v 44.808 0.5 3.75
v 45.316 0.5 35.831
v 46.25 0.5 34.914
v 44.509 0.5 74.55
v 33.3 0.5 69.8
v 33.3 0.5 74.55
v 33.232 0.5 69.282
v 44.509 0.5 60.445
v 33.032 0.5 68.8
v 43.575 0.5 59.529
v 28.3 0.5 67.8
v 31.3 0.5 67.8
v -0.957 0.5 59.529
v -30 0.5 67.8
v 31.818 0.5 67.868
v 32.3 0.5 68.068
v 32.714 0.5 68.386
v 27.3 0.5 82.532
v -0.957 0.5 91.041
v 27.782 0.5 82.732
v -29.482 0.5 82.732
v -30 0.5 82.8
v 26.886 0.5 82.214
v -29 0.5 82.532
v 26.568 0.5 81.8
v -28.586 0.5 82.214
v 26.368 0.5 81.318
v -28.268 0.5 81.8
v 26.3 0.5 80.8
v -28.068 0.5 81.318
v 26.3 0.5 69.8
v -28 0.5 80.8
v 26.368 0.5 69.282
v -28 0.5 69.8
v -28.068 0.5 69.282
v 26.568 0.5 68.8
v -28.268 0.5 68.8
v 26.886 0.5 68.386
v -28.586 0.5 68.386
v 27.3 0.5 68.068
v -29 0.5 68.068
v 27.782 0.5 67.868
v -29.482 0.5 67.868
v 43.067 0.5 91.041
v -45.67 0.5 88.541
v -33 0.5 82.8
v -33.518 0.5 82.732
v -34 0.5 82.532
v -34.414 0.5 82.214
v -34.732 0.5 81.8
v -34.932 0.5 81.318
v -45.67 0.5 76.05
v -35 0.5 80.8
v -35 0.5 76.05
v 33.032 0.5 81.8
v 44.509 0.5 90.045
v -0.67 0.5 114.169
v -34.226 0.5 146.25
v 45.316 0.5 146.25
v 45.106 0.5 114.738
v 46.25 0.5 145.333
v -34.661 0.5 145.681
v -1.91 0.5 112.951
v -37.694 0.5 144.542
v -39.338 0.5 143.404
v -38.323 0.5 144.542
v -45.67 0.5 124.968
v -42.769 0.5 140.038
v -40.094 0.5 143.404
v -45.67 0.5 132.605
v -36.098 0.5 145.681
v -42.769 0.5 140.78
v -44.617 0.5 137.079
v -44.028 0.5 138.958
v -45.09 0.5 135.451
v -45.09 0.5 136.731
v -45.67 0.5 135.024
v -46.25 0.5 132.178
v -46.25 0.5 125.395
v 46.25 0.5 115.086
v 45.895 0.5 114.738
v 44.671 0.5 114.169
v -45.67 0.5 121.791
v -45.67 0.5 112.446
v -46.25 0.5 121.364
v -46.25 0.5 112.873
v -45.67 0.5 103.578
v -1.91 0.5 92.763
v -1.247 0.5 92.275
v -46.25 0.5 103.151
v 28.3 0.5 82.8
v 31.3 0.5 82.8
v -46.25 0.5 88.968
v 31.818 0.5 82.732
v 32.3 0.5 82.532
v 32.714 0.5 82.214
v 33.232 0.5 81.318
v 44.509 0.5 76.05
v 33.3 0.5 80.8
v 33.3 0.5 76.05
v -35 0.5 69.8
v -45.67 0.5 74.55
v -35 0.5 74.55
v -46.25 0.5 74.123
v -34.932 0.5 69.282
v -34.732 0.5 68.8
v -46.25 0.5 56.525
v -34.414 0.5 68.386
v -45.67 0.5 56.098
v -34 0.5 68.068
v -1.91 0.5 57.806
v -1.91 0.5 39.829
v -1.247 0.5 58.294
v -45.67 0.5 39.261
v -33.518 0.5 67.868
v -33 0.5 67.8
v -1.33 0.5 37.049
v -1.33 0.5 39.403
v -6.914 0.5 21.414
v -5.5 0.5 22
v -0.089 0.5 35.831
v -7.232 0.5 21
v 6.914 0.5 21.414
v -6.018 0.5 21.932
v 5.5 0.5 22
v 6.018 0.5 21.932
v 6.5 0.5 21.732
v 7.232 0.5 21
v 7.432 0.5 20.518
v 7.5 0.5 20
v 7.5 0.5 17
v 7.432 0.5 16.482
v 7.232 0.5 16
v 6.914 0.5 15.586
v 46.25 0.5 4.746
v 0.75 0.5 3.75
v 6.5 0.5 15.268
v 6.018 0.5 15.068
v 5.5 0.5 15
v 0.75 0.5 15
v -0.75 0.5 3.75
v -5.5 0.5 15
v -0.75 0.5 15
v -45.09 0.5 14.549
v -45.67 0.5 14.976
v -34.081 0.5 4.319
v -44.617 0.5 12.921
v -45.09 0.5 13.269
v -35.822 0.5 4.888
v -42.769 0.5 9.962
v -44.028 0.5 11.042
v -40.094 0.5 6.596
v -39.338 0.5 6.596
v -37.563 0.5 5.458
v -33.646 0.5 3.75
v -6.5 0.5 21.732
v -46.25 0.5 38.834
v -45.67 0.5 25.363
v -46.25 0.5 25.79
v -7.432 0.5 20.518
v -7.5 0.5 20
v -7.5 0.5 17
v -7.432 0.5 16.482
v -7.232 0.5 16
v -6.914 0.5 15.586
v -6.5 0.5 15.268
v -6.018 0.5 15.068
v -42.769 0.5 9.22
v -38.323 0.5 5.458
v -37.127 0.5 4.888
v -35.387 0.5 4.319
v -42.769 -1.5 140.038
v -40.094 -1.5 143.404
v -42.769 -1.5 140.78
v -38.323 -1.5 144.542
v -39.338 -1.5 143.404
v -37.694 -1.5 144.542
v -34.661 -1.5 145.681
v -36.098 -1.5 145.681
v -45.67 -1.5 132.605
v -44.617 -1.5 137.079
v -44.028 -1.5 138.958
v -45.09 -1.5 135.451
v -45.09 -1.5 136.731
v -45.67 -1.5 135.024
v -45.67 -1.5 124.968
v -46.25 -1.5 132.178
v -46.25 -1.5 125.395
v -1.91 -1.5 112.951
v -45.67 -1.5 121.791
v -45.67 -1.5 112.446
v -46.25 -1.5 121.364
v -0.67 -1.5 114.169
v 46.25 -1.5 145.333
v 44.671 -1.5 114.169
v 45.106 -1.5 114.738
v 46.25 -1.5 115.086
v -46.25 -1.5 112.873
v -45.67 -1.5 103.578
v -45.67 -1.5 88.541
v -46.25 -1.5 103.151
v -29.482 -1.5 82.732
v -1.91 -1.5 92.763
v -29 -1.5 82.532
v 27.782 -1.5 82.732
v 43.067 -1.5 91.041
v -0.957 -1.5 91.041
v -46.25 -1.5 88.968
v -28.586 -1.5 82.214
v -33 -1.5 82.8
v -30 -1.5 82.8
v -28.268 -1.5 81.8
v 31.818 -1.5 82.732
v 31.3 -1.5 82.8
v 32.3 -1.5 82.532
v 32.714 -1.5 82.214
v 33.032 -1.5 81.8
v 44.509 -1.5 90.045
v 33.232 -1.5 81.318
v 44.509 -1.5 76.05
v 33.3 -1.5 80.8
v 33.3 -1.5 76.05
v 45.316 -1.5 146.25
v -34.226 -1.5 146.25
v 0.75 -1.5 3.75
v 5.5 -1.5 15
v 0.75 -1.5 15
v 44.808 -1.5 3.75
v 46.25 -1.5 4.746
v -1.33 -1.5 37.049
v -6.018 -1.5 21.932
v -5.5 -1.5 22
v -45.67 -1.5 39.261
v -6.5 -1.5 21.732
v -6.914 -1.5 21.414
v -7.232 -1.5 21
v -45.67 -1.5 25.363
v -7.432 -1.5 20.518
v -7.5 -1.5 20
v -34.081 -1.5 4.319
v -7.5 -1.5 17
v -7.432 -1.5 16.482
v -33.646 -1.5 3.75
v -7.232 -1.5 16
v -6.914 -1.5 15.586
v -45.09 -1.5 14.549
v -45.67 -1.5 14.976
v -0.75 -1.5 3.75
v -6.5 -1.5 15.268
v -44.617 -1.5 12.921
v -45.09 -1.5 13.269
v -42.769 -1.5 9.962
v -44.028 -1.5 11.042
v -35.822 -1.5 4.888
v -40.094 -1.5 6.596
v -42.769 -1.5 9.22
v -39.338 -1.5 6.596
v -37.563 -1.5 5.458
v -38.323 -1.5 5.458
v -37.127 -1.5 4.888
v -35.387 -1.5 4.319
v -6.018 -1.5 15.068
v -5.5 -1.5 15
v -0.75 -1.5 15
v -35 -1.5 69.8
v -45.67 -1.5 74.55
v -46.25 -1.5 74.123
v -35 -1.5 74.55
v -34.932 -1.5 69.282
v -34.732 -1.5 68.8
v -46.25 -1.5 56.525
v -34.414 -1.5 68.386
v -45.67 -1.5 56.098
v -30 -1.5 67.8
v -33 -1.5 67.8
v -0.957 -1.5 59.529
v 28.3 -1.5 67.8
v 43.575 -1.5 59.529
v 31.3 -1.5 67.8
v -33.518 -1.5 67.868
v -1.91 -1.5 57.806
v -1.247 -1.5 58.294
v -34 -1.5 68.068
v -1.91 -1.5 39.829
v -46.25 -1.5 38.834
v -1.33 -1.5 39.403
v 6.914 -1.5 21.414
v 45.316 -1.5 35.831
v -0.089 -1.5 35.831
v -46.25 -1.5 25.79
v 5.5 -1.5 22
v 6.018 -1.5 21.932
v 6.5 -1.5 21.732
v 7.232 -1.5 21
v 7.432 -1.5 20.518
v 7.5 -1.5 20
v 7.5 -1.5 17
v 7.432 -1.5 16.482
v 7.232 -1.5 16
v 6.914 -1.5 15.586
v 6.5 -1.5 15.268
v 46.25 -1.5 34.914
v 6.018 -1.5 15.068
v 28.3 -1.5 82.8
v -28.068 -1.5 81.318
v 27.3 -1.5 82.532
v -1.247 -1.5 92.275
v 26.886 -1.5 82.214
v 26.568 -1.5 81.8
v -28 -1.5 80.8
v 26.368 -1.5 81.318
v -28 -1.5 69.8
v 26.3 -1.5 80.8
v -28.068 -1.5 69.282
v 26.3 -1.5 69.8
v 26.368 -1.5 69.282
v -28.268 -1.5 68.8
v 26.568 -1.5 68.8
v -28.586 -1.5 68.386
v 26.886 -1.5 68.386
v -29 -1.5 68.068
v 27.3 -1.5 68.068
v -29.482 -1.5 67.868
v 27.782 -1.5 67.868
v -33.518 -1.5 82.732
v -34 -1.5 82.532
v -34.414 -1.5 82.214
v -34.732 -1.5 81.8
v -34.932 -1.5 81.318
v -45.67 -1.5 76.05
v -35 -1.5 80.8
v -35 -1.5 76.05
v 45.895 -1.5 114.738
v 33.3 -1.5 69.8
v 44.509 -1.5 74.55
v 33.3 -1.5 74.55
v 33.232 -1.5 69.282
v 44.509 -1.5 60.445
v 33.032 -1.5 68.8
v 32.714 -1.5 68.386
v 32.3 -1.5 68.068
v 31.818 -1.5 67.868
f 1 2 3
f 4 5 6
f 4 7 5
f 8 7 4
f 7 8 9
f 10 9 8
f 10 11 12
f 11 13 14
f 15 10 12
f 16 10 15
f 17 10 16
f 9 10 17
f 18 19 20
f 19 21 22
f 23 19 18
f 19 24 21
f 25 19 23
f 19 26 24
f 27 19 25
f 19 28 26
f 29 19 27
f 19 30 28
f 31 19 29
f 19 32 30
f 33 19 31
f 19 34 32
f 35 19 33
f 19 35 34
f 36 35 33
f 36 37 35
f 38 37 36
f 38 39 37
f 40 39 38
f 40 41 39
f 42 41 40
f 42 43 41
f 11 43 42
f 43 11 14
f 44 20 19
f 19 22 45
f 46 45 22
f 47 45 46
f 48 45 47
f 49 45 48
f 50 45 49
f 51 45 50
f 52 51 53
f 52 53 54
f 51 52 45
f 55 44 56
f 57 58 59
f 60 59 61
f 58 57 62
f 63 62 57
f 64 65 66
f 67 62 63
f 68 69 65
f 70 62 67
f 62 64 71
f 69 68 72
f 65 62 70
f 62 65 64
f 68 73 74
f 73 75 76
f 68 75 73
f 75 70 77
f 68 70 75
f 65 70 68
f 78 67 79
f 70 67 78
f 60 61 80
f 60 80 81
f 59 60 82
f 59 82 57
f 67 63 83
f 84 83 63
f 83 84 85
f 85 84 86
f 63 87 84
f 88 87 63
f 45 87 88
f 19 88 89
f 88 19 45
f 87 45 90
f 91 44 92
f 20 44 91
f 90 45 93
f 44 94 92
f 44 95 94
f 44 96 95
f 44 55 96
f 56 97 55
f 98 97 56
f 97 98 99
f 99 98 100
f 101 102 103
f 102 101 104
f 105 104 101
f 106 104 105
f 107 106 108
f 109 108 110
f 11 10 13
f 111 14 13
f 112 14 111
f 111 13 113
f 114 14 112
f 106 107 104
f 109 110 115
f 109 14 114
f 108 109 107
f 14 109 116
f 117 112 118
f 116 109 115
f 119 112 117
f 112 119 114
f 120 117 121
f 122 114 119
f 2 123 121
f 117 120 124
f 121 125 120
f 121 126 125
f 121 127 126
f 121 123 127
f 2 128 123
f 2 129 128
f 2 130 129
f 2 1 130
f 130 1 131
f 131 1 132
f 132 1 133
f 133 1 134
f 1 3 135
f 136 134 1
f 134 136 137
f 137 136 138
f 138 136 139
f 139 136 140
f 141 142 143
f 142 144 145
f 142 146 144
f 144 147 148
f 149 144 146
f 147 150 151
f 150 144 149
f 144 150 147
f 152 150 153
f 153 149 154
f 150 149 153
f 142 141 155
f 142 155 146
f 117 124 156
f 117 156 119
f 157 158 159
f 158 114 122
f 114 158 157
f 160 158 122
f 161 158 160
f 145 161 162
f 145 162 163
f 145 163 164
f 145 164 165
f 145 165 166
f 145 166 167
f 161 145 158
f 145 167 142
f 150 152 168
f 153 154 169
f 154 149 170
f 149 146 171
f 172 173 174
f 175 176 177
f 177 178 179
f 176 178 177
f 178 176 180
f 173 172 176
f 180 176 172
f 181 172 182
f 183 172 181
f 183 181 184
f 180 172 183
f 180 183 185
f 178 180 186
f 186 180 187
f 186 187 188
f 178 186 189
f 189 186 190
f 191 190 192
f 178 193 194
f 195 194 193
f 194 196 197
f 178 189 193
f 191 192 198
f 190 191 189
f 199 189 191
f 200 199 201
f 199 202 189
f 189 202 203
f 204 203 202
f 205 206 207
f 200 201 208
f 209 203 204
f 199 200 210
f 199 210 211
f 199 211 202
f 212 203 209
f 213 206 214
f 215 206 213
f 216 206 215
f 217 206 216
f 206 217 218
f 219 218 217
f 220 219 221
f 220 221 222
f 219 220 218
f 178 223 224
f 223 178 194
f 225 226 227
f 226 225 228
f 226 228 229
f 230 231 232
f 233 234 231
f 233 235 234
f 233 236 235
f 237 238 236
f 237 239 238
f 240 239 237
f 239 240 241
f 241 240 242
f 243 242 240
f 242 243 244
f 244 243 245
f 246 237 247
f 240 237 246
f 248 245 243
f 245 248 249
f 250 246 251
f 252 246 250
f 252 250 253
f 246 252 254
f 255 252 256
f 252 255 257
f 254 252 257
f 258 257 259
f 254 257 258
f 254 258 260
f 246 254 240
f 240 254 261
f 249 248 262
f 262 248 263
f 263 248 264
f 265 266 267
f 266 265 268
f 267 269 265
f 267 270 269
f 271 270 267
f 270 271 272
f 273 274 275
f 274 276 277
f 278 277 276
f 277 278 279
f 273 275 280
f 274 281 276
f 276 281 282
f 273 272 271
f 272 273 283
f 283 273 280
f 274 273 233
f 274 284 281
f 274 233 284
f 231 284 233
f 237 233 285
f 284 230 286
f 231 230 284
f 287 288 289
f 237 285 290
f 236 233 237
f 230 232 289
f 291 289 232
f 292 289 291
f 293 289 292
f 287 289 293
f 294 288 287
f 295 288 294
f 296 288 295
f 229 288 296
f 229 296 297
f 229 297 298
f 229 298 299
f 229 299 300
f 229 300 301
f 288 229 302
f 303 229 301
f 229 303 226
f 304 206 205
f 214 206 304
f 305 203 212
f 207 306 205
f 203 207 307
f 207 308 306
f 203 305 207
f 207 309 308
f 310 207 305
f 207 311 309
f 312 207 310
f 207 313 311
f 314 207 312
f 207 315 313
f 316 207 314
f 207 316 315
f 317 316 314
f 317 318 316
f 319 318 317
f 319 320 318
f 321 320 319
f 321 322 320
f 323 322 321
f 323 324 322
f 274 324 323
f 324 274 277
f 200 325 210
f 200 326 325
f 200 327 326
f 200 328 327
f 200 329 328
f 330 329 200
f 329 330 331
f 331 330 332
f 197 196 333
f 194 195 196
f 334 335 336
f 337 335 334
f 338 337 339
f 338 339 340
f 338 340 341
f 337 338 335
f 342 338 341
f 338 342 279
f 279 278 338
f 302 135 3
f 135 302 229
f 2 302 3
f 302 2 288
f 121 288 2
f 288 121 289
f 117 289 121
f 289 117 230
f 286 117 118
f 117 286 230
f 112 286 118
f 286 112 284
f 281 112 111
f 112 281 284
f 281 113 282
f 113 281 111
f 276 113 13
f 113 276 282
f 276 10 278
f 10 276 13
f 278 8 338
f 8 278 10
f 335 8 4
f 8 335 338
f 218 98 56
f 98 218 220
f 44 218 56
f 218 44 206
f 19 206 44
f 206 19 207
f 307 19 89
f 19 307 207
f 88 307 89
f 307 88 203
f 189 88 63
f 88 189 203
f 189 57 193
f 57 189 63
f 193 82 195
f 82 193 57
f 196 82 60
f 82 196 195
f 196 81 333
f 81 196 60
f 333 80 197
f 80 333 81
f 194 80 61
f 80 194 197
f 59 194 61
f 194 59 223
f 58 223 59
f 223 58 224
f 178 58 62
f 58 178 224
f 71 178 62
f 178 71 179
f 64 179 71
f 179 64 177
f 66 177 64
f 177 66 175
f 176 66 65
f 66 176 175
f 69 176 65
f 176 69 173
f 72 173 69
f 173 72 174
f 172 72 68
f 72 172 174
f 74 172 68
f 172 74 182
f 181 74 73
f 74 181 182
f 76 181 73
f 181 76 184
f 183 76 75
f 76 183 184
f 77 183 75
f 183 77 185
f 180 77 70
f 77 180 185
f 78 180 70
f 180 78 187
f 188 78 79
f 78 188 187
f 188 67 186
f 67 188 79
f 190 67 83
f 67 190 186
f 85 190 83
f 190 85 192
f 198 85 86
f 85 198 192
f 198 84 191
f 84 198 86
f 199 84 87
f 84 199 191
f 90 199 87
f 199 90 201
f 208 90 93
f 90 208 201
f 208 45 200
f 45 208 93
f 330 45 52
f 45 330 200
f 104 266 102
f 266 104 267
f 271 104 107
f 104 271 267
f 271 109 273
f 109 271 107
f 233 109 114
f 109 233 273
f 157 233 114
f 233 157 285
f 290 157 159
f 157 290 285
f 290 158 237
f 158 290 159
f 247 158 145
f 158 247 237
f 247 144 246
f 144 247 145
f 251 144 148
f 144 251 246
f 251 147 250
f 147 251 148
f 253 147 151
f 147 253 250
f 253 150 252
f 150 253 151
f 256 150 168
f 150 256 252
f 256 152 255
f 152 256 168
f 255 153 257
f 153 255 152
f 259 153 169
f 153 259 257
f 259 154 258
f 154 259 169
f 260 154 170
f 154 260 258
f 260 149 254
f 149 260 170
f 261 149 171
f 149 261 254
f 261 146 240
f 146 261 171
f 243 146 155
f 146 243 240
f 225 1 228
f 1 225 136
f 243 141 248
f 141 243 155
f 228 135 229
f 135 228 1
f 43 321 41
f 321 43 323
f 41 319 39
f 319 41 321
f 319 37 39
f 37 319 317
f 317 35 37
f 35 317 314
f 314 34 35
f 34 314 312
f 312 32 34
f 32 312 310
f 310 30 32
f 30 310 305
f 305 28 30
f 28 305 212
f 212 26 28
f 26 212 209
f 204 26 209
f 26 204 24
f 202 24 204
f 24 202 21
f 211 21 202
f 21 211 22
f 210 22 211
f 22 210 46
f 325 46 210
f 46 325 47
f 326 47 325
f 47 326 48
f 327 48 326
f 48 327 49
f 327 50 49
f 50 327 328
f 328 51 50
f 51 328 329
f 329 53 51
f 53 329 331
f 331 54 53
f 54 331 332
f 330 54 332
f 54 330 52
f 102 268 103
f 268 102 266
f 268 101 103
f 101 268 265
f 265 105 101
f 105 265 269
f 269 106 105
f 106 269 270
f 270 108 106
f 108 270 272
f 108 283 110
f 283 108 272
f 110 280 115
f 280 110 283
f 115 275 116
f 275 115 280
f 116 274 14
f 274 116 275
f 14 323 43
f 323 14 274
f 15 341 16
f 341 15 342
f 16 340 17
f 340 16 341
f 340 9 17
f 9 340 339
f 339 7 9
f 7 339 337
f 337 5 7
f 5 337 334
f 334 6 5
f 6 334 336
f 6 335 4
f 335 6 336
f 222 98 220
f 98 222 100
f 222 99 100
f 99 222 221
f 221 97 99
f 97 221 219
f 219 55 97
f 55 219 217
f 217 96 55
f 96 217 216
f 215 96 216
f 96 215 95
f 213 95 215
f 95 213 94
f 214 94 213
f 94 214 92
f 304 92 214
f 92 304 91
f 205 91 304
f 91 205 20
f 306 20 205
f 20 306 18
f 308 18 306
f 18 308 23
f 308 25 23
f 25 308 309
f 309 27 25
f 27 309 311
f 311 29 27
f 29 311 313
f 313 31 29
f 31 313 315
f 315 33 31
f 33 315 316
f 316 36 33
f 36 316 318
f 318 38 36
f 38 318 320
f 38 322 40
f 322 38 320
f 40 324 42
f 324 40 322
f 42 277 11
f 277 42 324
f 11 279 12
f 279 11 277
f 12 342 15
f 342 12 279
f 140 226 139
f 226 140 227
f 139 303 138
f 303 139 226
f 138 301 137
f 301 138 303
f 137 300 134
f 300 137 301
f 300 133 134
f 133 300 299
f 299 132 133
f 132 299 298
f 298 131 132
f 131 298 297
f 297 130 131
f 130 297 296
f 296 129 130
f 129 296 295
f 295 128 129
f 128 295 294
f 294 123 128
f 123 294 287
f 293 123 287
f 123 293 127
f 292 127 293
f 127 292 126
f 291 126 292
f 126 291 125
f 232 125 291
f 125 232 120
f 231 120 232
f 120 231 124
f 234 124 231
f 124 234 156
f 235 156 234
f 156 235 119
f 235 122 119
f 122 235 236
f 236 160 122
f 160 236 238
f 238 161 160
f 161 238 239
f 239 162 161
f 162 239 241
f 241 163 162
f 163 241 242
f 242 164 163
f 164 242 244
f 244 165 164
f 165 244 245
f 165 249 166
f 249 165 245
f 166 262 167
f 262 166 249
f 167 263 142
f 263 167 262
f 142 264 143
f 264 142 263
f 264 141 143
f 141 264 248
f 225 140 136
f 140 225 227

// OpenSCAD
// file: shape_pts.scad
// Letter "E" (#1 Top) ? Side Flame Sockets + Bottom Conduit to n
// Vertical-display edition: bottom divider clip removed, interlocking hollow double-dovetail channels added.

shape_w = 94.00;
shape_h = 144.00;

rec_snap_top_x = 10.00;
rec_snap_top_z = 144.00;
rec_snap_bot_x = 0.00;

rec_top_conn_enable   = false;
rec_top_conn_x        = 0.00;
rec_bot_conn_enable   = true;
rec_bot_conn_x        = 0.00;
rec_left_conn_enable  = true;
rec_left_conn_z       = 72.30;
rec_left_conn_face_x  = -50.00;
rec_left_conn_pocket_x = -31.50;
rec_right_conn_enable = true;
rec_right_conn_z      = 72.30;
rec_right_conn_face_x = 48.26;
rec_right_conn_pocket_x = 29.80;

rec_magnet_enable = true;
rec_magnet_x      = -24.00;
rec_magnet_z      = 105.20;

rec_wall_mount_enable = true;
rec_wall_mount_x      = 0.00;
rec_wall_mount_z      = 72.30;

rec_include_controller = false;
rec_chip_x     = -24.50;
rec_chip_z     = 82.00;
rec_cable_x    = -24.50;
rec_ziptie_z   = 33.50;
rec_keyhole_z  = 19.50;
rec_slit_dir   = -1;

rec_pillars = [[28.0, 18.0], [25.0, 127.5], [-24.5, 128.0], [-24.5, 35.0]];
rec_has_face_grooves = false;

shape_pts = [
    [0.218,33.581], [-0.58,34.364], [-0.58,36.783], [-1.16,37.209], [-1.16,54.427], [-0.58,54.854],
    [-0.363,55.779], [43.881,55.779], [45.259,57.13], [45.259,87.439], [43.301,88.791], [-0.363,88.791],
    [-0.58,89.715], [-1.16,90.142], [-1.16,109.636], [-0.363,110.419], [45.042,110.419], [45.477,110.988],
    [46.202,110.988], [47.0,111.771], [47.0,142.648], [45.622,144.0], [-34.597,144.0], [-35.032,143.431],
    [-36.338,143.431], [-37.934,142.292], [-38.659,142.292], [-39.674,141.154], [-40.4,141.154], [-43.519,138.095],
    [-43.519,137.383], [-44.679,136.387], [-45.259,134.538], [-45.84,134.111], [-45.84,132.83], [-46.42,132.403],
    [-46.42,129.984], [-47.0,129.557], [-47.0,122.016], [-46.42,121.589], [-46.42,119.17], [-47.0,118.743],
    [-47.0,109.494], [-46.42,109.067], [-46.42,100.957], [-47.0,100.53], [-47.0,85.589], [-46.42,85.162],
    [-46.42,71.929], [-47.0,71.502], [-47.0,53.146], [-46.42,52.719], [-46.42,36.64], [-47.0,36.213],
    [-47.0,22.411], [-46.42,21.984], [-46.42,11.597], [-45.84,11.17], [-45.84,9.889], [-45.259,9.462],
    [-44.679,7.613], [-43.519,6.617], [-43.519,5.905], [-40.4,2.846], [-39.674,2.846], [-38.659,1.708],
    [-37.934,1.708], [-37.498,1.138], [-36.193,1.138], [-35.758,0.569], [-34.452,0.569], [-34.017,0.0],
    [45.042,0.0], [47.0,1.352], [47.0,32.229], [45.622,33.581]
];
shape_paths = [[0, 1, 2, 3, 4, 5, 6, 7, 8, 9, 10, 11, 12, 13, 14, 15, 16, 17, 18, 19, 20, 21, 22, 23, 24, 25, 26, 27, 28, 29, 30, 31, 32, 33, 34, 35, 36, 37, 38, 39, 40, 41, 42, 43, 44, 45, 46, 47, 48, 49, 50, 51, 52, 53, 54, 55, 56, 57, 58, 59, 60, 61, 62, 63, 64, 65, 66, 67, 68, 69, 70, 71, 72, 73, 74, 75]];

diffuser_shape_pts = [
    [0.218,33.581], [-0.58,34.364], [-0.58,36.783], [-1.16,37.209], [-1.16,54.427], [-0.58,54.854],
    [-0.363,55.779], [43.881,55.779], [45.259,57.13], [45.259,87.439], [43.301,88.791], [-0.363,88.791],
    [-0.58,89.715], [-1.16,90.142], [-1.16,109.636], [-0.363,110.419], [45.042,110.419], [45.477,110.988],
    [46.202,110.988], [47.0,111.771], [47.0,142.648], [45.622,144.0], [-23.005,144.0], [-23.429,143.431],
    [-24.137,143.431], [-26.614,140.941], [-26.614,140.229], [-32.489,134.324], [-33.197,134.324], [-34.188,133.186],
    [-36.029,132.617], [-36.453,132.047], [-38.294,131.478], [-38.718,130.909], [-39.992,130.909], [-40.417,130.34],
    [-42.258,130.34], [-42.682,129.771], [-45.089,129.771], [-46.434,128.419], [-46.434,127.708], [-47.0,127.281],
    [-46.42,119.17], [-47.0,118.743], [-47.0,109.494], [-46.42,109.067], [-46.42,100.957], [-47.0,100.53],
    [-47.0,85.589], [-46.42,85.162], [-46.42,71.929], [-47.0,71.502], [-47.0,53.146], [-46.42,52.719],
    [-46.42,36.64], [-47.0,36.213], [-47.0,22.411], [-46.42,21.984], [-46.42,11.597], [-45.84,11.17],
    [-45.84,9.889], [-45.259,9.462], [-44.679,7.613], [-43.519,6.617], [-43.519,5.905], [-40.4,2.846],
    [-39.674,2.846], [-38.659,1.708], [-37.934,1.708], [-37.498,1.138], [-36.193,1.138], [-35.758,0.569],
    [-34.452,0.569], [-34.017,0.0], [45.042,0.0], [47.0,1.352], [47.0,32.229], [45.622,33.581]
];
diffuser_shape_paths = [[0, 1, 2, 3, 4, 5, 6, 7, 8, 9, 10, 11, 12, 13, 14, 15, 16, 17, 18, 19, 20, 21, 22, 23, 24, 25, 26, 27, 28, 29, 30, 31, 32, 33, 34, 35, 36, 37, 38, 39, 40, 41, 42, 43, 44, 45, 46, 47, 48, 49, 50, 51, 52, 53, 54, 55, 56, 57, 58, 59, 60, 61, 62, 63, 64, 65, 66, 67, 68, 69, 70, 71, 72, 73, 74, 75, 76, 77]];

module shape_2d(pts = shape_pts) {
    polygon(points = pts, paths = shape_paths);
}

module diffuser_shape_2d(pts = diffuser_shape_pts) {
    polygon(points = pts, paths = diffuser_shape_paths);
}

module diffuser_face_grooves_2d() {}
// main file
// Letter "E" (#1 Top) ? Side Flame Sockets + Bottom Conduit to n ? internal white reflector plate (2.00 mm thick, aligned LED-strip conduit pockets + entry slits)
// Opens and exports standalone in OpenSCAD / OpenSCAD.js.

use <lamp_core.scad>

render_lamp_part("reflector");
